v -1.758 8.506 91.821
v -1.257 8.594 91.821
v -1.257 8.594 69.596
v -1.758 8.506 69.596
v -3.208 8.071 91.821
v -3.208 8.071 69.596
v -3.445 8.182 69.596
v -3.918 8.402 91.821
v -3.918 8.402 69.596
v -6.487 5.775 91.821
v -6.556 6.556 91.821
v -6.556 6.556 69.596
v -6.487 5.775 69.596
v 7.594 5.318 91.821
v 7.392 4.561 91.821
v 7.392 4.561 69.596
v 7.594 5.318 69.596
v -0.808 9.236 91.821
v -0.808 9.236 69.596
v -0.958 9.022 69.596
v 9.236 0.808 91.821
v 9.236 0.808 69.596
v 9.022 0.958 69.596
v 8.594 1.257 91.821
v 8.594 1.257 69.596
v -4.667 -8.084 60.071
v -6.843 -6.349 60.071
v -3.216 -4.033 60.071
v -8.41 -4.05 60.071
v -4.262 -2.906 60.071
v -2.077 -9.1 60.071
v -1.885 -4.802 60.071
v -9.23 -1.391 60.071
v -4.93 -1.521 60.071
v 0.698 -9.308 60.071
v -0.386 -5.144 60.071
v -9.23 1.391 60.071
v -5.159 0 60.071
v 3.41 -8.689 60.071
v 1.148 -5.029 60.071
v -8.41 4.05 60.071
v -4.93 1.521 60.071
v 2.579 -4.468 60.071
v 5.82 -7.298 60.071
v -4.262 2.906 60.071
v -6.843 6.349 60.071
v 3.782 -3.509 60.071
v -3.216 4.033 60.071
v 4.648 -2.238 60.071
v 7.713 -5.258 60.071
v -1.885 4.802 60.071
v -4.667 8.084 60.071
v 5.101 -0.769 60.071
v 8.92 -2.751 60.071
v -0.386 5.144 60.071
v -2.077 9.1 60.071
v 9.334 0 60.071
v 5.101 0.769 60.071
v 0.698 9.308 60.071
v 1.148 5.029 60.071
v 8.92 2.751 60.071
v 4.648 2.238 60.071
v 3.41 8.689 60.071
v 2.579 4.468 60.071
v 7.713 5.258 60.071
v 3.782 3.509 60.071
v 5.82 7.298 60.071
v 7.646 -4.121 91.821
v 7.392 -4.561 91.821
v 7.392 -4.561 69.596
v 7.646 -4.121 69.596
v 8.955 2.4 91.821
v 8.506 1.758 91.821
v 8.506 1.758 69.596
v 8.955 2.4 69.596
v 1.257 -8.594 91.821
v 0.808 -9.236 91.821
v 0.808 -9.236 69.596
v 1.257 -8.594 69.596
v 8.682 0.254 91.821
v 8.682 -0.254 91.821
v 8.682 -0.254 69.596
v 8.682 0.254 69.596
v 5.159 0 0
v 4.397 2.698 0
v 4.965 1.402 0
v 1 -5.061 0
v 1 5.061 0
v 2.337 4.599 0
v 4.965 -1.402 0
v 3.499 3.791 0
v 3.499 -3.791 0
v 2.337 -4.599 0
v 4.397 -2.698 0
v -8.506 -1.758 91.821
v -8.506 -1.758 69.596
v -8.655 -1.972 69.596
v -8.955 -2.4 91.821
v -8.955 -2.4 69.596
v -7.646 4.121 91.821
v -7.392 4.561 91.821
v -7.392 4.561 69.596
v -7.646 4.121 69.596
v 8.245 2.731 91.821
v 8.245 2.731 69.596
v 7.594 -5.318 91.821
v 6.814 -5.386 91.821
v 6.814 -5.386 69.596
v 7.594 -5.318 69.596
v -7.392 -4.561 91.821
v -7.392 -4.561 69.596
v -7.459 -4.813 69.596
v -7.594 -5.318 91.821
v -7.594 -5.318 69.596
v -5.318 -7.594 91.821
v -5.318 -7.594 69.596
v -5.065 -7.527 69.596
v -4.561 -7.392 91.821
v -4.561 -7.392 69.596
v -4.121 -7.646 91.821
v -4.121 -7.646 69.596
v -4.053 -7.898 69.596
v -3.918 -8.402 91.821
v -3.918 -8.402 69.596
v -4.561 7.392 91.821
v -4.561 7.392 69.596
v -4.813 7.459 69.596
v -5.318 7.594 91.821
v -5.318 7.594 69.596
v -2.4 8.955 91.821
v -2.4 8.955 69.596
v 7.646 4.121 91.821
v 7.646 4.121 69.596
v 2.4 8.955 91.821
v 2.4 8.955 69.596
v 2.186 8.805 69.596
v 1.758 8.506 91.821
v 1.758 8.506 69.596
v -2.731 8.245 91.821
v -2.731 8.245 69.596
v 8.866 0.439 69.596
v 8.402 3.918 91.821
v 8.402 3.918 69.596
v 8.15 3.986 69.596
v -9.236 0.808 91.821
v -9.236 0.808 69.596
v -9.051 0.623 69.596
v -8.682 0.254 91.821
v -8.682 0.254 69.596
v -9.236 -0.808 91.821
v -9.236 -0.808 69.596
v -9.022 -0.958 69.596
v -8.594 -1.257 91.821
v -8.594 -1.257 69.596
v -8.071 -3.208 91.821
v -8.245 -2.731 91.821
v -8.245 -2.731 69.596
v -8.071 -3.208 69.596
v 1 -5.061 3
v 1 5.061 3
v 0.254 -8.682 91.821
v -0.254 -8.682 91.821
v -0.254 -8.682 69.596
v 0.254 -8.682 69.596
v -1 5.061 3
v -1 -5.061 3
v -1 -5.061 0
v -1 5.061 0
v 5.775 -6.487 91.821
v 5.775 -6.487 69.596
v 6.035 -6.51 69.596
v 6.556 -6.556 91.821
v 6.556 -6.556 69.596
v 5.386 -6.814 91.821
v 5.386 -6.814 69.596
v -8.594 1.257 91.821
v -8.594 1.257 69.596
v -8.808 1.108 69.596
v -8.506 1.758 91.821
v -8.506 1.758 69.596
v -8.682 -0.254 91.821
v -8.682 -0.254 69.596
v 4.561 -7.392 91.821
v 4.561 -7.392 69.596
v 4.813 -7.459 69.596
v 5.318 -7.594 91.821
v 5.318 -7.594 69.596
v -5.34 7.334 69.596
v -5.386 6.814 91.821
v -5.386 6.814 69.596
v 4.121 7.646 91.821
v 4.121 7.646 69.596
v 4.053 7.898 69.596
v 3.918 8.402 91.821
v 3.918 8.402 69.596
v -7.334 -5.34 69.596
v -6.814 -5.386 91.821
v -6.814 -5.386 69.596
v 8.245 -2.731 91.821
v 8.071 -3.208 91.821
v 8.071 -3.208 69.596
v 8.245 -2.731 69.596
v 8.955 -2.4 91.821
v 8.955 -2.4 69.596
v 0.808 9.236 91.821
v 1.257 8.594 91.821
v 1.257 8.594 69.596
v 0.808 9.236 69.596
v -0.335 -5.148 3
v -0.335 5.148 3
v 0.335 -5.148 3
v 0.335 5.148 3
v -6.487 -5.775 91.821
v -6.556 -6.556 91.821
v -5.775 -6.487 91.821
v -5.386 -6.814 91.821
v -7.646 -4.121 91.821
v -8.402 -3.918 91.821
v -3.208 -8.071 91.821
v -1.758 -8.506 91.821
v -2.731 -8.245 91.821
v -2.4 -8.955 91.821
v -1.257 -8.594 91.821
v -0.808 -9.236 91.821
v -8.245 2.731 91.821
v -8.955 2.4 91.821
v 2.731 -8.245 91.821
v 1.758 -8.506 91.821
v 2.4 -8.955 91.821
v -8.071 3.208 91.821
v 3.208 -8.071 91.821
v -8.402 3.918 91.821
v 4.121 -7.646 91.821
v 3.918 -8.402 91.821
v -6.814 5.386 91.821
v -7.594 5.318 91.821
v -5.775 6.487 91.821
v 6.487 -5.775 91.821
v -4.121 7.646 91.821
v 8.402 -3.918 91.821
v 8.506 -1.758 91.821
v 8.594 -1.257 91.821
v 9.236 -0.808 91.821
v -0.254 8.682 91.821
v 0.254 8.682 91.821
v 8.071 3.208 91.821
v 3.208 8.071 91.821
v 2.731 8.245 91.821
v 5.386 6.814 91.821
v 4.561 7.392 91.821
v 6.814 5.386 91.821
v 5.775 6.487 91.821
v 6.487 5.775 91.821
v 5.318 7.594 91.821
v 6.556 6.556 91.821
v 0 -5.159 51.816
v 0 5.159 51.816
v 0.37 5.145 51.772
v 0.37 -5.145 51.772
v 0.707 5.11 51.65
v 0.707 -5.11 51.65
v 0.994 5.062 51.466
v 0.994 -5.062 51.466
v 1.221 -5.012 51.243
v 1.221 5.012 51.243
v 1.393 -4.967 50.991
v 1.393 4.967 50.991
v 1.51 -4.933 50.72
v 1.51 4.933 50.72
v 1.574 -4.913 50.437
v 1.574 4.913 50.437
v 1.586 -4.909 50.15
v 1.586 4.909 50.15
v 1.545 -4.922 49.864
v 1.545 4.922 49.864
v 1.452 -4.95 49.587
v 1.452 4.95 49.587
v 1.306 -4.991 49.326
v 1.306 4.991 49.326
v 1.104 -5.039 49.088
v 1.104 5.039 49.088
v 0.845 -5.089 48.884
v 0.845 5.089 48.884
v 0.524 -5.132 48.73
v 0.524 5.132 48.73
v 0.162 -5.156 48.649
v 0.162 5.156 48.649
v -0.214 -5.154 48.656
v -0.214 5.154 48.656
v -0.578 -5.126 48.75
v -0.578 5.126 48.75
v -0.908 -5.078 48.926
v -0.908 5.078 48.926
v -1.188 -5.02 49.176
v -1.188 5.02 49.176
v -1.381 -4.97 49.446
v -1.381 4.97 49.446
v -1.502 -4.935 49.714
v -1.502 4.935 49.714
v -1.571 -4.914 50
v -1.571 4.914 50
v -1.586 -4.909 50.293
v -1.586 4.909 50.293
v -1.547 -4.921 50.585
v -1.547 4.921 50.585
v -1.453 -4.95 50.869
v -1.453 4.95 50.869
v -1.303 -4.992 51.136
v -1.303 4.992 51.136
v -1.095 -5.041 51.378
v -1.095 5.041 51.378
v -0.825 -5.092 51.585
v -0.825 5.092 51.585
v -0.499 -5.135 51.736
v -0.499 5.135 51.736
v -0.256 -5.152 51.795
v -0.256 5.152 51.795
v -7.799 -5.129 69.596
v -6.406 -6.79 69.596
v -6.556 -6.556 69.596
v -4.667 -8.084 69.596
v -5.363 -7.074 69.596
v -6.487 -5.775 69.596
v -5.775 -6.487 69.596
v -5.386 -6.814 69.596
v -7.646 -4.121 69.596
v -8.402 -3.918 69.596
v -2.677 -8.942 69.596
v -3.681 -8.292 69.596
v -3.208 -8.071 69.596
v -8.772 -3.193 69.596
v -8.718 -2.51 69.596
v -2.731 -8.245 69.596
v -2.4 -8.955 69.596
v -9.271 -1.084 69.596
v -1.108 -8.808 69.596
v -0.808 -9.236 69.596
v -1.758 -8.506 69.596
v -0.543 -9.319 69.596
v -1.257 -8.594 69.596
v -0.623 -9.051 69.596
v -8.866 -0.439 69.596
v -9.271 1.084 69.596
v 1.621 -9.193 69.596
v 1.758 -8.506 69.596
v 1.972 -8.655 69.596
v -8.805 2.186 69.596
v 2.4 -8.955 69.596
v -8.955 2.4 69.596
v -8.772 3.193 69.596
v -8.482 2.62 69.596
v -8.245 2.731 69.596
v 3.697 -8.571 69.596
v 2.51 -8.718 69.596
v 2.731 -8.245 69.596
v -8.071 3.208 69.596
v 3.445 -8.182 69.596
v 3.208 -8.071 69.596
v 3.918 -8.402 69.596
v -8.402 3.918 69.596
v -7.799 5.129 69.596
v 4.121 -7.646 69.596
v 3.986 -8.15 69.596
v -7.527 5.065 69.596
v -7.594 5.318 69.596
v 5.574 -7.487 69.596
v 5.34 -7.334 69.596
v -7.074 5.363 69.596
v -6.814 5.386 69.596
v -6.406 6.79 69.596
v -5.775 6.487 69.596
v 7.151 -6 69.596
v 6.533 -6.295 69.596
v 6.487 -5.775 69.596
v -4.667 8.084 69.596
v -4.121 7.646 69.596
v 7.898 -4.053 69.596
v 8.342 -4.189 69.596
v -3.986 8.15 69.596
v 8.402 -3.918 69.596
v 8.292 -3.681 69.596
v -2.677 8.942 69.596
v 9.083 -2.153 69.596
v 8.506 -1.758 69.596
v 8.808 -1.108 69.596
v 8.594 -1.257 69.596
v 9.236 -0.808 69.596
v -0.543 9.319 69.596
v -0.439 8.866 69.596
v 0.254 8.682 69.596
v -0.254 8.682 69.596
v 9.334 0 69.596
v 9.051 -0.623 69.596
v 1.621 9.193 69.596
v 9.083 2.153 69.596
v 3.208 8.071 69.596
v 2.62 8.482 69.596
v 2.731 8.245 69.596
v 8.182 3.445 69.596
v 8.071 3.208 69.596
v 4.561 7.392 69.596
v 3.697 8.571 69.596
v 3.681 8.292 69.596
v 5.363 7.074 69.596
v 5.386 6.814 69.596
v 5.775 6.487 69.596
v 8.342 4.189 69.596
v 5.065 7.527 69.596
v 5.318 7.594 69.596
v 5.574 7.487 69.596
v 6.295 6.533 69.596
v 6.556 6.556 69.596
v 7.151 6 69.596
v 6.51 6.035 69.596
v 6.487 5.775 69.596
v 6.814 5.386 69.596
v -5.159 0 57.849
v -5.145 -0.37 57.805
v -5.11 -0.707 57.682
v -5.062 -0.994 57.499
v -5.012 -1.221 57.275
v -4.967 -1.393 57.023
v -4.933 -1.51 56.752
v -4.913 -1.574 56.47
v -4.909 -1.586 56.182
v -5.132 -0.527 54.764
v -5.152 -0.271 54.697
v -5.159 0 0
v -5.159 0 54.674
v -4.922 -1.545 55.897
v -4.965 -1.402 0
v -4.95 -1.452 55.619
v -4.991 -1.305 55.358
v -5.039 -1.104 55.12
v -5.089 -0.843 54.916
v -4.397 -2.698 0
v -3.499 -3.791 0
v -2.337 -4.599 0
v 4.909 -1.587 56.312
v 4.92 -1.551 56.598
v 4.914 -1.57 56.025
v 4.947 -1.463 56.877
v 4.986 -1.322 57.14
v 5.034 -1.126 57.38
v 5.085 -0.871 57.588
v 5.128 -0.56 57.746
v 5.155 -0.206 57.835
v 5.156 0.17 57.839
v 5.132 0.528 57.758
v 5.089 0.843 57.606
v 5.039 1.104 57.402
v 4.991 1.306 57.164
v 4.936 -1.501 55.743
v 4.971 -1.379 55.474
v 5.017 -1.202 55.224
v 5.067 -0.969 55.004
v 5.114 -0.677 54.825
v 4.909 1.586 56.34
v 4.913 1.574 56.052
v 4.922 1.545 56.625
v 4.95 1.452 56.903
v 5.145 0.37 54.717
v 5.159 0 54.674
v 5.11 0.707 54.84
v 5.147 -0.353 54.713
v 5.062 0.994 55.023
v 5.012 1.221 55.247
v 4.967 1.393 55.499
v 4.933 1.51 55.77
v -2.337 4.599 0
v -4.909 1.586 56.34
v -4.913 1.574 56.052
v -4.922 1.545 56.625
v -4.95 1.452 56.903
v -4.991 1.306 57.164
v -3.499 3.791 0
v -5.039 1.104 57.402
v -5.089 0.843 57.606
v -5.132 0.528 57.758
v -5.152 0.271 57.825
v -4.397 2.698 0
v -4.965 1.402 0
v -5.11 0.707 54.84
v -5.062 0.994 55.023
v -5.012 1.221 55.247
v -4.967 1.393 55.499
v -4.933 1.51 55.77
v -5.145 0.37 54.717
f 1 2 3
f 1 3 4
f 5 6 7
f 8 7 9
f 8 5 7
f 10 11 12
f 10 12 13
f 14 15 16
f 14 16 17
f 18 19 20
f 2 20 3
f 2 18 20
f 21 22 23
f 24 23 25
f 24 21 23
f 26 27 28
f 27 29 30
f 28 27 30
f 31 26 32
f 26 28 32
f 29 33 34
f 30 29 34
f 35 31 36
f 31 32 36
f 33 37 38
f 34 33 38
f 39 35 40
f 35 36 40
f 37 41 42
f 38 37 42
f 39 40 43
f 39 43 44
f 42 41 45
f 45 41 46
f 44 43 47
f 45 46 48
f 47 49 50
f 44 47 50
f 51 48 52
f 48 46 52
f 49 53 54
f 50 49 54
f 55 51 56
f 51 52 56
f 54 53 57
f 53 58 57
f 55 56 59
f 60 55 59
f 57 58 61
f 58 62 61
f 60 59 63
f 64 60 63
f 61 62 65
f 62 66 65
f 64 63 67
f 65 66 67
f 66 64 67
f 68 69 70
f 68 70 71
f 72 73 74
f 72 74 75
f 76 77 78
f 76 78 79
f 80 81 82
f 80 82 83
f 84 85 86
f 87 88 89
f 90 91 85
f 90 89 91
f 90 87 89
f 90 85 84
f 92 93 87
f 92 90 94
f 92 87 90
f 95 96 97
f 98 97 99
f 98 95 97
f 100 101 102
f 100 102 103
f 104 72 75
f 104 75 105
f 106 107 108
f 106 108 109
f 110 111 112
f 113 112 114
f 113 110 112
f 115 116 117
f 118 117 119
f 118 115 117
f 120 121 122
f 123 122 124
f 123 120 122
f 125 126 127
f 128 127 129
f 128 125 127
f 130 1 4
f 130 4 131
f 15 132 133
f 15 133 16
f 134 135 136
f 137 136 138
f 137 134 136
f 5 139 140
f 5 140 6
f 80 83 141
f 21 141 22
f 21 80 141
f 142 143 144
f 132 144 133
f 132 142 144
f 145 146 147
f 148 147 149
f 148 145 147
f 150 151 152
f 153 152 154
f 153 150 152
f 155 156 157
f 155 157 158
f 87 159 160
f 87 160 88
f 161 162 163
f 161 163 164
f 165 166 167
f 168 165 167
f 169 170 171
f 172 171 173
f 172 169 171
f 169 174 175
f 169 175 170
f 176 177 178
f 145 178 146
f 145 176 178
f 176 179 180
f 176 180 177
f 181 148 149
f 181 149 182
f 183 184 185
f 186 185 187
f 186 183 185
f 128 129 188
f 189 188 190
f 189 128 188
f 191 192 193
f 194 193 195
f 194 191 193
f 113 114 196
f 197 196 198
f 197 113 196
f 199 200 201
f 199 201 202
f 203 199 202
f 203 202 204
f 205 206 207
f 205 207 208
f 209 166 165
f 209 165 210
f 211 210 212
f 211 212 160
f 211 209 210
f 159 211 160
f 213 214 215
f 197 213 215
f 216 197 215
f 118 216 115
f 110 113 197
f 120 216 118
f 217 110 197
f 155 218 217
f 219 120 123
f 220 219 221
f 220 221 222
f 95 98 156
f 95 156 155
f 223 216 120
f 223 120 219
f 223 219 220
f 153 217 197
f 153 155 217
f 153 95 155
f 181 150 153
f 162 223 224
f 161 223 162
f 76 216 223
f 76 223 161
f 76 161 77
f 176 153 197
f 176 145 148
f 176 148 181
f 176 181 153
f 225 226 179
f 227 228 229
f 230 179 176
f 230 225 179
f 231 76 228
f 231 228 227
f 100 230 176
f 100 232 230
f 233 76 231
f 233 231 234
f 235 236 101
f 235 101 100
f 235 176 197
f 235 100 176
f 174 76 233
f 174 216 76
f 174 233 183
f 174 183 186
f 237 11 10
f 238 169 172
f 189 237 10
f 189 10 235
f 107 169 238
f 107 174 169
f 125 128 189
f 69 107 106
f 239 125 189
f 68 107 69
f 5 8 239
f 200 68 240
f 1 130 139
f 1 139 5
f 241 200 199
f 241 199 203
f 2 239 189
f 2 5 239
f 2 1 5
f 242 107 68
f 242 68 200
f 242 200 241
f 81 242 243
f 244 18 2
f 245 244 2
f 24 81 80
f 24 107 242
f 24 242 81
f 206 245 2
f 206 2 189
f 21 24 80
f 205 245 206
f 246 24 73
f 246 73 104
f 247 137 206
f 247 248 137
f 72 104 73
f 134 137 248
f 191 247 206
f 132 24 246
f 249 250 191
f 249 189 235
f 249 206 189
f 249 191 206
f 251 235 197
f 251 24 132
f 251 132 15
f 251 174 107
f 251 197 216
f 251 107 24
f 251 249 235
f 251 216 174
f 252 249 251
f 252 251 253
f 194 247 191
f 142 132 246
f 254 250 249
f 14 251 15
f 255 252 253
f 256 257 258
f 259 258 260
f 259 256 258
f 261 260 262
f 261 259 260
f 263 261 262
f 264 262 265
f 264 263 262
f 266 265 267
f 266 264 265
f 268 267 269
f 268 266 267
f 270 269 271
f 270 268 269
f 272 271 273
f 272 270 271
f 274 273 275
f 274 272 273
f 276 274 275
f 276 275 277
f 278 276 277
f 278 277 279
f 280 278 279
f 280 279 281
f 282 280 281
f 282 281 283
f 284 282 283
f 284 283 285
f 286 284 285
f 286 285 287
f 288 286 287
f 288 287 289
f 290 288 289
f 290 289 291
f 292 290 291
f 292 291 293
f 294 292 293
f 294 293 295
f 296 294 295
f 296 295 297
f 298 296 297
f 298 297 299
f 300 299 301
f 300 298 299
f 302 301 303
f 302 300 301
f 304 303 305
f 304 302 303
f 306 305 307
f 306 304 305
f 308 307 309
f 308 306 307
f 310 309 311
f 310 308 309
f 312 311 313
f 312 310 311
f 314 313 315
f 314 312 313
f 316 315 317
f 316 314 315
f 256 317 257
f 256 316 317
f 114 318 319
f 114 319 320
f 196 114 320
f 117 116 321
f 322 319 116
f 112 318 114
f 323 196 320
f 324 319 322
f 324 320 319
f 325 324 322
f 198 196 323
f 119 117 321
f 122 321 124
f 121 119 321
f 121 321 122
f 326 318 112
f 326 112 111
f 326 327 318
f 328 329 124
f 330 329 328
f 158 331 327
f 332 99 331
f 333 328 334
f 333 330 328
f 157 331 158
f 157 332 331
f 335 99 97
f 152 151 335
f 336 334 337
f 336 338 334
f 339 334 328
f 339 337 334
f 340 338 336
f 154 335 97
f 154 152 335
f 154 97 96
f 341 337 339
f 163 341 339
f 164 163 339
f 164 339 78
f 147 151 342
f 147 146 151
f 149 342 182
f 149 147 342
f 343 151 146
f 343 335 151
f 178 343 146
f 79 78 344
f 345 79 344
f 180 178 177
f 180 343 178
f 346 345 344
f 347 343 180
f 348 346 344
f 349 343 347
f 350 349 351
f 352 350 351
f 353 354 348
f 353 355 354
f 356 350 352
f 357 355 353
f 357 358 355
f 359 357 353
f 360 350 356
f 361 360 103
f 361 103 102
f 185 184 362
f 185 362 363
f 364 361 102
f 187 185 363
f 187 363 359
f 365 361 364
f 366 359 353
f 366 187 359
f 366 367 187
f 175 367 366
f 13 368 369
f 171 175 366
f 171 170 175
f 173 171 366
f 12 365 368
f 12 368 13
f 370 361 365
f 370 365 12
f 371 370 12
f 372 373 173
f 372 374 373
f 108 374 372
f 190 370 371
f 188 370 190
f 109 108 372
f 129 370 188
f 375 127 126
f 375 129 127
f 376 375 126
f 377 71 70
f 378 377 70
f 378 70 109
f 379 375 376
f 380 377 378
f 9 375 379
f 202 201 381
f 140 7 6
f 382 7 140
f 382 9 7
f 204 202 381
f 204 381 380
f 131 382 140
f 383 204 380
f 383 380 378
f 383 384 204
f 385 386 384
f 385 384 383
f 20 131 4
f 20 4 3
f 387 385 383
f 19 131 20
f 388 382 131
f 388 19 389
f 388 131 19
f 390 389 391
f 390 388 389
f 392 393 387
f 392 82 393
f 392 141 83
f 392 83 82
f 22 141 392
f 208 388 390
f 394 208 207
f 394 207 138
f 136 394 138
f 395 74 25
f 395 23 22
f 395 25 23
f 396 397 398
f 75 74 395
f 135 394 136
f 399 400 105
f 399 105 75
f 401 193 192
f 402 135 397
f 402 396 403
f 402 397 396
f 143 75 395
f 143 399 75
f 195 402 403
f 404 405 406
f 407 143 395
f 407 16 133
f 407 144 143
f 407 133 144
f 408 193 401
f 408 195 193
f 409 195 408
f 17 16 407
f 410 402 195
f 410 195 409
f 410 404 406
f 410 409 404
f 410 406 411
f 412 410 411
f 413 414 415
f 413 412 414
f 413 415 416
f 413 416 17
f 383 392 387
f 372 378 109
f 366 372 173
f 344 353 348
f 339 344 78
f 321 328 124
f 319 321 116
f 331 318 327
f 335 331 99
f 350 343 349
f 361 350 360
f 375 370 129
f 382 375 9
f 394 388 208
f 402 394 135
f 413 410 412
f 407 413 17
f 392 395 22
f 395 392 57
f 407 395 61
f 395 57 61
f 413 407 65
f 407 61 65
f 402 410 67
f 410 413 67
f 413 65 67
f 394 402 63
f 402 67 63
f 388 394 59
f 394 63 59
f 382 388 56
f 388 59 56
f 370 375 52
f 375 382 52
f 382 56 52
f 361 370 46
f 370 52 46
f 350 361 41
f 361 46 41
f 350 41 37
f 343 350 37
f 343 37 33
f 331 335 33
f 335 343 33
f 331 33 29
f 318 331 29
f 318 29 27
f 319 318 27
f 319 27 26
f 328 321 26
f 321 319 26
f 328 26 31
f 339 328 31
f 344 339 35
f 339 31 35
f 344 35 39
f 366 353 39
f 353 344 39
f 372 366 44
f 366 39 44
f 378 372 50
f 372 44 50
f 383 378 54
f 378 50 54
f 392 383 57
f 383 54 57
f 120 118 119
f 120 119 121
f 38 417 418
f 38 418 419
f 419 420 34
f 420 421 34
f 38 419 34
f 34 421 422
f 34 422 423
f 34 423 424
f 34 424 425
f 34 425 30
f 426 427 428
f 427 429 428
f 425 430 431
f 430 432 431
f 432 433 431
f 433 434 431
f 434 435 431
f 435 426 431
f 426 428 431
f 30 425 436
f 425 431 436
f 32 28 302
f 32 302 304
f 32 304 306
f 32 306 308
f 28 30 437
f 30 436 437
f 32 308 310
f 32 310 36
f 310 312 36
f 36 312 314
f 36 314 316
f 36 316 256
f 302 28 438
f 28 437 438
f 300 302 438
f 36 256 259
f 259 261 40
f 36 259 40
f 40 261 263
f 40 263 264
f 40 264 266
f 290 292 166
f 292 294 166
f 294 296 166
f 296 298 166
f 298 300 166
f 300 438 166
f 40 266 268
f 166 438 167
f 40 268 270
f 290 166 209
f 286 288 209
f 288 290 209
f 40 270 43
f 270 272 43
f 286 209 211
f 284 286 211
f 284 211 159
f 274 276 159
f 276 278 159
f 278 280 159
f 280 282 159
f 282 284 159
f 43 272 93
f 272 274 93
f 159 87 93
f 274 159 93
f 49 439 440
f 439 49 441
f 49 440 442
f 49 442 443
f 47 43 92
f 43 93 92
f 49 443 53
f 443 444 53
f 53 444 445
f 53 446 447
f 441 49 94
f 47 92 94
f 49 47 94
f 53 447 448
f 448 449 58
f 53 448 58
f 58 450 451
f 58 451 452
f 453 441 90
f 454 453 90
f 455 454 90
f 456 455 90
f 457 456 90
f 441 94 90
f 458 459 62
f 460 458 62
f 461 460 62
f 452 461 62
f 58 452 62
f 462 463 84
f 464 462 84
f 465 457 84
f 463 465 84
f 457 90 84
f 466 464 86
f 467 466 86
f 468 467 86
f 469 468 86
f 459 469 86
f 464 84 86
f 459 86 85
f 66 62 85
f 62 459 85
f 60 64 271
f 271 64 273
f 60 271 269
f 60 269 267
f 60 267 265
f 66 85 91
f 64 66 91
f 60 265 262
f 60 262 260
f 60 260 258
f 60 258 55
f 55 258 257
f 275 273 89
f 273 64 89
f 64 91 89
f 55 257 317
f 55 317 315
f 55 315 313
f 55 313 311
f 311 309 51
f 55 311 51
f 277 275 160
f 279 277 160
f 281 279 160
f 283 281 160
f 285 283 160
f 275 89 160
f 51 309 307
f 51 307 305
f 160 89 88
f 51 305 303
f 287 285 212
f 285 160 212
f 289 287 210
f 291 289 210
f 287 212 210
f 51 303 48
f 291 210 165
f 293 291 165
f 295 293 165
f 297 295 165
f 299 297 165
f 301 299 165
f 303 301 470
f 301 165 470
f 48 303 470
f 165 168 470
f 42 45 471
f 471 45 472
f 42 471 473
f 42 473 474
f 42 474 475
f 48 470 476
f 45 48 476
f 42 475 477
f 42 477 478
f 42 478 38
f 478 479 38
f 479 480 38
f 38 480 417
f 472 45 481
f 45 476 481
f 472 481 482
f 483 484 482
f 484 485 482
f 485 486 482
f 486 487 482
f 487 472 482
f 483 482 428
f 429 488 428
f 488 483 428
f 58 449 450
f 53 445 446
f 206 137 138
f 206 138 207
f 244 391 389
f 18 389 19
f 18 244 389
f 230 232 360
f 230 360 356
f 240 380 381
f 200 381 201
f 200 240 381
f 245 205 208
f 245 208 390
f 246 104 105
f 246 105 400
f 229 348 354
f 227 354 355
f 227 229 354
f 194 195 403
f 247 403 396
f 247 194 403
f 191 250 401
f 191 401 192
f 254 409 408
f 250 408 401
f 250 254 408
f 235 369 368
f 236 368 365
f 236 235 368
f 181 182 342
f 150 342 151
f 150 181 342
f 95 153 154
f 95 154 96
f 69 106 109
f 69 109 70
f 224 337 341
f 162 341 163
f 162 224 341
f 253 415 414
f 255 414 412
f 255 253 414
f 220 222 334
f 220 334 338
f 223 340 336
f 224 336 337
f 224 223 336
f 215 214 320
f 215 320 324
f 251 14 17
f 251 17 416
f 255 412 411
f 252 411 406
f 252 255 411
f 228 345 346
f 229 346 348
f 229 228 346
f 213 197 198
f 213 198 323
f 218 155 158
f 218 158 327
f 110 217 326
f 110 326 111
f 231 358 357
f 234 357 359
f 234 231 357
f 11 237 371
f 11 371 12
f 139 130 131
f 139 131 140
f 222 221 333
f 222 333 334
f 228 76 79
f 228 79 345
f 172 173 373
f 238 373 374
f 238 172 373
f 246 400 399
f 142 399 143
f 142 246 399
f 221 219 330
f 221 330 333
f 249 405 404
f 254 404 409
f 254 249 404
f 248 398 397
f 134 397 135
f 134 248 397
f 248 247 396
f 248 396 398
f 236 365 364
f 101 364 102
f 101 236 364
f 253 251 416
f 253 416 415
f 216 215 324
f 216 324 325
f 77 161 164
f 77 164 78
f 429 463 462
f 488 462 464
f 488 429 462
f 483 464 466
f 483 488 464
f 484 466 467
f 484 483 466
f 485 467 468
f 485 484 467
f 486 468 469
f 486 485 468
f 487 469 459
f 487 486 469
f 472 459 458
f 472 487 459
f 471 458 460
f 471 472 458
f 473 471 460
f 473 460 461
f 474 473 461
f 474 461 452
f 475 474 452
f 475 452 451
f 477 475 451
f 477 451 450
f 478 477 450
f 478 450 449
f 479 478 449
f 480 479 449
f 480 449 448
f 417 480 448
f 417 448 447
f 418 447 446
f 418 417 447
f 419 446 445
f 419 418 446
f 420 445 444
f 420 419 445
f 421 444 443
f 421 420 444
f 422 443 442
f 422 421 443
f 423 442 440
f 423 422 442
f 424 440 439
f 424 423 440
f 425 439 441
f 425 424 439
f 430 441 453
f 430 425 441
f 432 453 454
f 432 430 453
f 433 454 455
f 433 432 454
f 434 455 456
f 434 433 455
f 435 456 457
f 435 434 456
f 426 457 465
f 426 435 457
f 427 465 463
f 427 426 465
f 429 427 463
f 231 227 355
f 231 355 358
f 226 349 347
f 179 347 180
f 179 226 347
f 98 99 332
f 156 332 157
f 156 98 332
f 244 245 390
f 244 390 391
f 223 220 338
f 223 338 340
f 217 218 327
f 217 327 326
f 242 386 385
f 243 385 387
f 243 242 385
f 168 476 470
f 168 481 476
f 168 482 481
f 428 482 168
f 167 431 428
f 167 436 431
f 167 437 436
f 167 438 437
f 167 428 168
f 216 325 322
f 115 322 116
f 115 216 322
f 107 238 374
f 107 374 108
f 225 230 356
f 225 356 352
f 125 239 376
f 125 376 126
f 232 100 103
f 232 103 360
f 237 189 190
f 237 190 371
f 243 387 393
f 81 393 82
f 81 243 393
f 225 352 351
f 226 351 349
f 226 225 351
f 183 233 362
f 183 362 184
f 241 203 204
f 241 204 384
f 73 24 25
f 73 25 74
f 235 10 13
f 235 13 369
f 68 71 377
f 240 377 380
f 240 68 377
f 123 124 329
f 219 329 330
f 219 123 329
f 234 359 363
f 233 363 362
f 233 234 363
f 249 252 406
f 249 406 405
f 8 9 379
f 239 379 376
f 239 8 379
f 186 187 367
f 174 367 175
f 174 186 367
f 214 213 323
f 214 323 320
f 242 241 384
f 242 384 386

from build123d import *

# Parameters (mm, degrees)
SKETCH5_W                = 5.15874
SKETCH5_H                = 60.071
SKETCH10_R               = 9.3345
BOSS_EXTRUDE1_DEPTH      = 31.75
CUT_EXTRUDE7_START       = 91.821
SKETCH8_R                = 12.7
CUT_EXTRUDE7_DEPTH       = 22.225
CUT_EXTRUDE9_DEPTH       = 93.765089454
CUT_EXTRUDE9_DEPTH_BACK  = 93.765089454
SKETCH11_W               = 2
SKETCH11_H               = 3
CUT_EXTRUDE10_DEPTH      = 93.765089454
CUT_EXTRUDE10_DEPTH_BACK = 93.765089454
SKETCH12_R               = 1.5875
CUT_EXTRUDE11_DEPTH      = 93.765089454
CUT_EXTRUDE11_DEPTH_BACK = 93.765089454
SKETCH13_R               = 1.5875


with BuildPart() as part:
    # Sketch5 → Revolve2 (revolve)
    with BuildSketch(Plane(origin=(0, 0, 0), x_dir=(1, 0, 0), z_dir=(0, 1, 0)), mode=Mode.PRIVATE) as revolve2_sk:
        with Locations((2.57937, -30.0355)):
            Rectangle(SKETCH5_W, SKETCH5_H)
    revolve(revolve2_sk.sketch.rotate(Axis((0, 0, 0), (0, 0, 1)), 180), axis=Axis((0, 0, 0), (0, 0, 1)))

    # Sketch10 → Boss-Extrude1 (add)
    with BuildSketch(Plane.XY.offset(60.071)):
        Circle(SKETCH10_R)
    extrude(amount=BOSS_EXTRUDE1_DEPTH)

    # Sketch8 → Cut-Extrude7 (cut)
    with BuildSketch(Plane.XY.offset(CUT_EXTRUDE7_START)):
        Circle(SKETCH8_R)
        Polygon((9.235721046, -0.808020891), (8.681700155, -0.254), (8.681700155, 0.254), (9.235721046, 0.808020891), (8.593912259, 1.257420242), (8.505698985, 1.75770258), (8.955098336, 2.399511367), (8.245002688, 2.730634406), (8.071256455, 3.207998257), (8.402379494, 3.918093905), (7.645572882, 4.120879625), (7.391572882, 4.56082053), (7.594358603, 5.317627141), (6.813836213, 5.385914002), (6.487300108, 5.775064579), (6.555586968, 6.555586968), (5.775064579, 6.487300108), (5.385914002, 6.813836213), (5.317627141, 7.594358603), (4.56082053, 7.391572882), (4.120879625, 7.645572882), (3.918093905, 8.402379494), (3.207998257, 8.071256455), (2.730634406, 8.245002688), (2.399511367, 8.955098336), (1.75770258, 8.505698985), (1.257420242, 8.593912259), (0.808020891, 9.235721046), (0.254, 8.681700155), (-0.254, 8.681700155), (-0.808020891, 9.235721046), (-1.257420242, 8.593912259), (-1.75770258, 8.505698985), (-2.399511367, 8.955098336), (-2.730634406, 8.245002688), (-3.207998257, 8.071256455), (-3.918093905, 8.402379494), (-4.120879625, 7.645572882), (-4.56082053, 7.391572882), (-5.317627141, 7.594358603), (-5.385914002, 6.813836213), (-5.775064579, 6.487300108), (-6.555586968, 6.555586968), (-6.487300108, 5.775064579), (-6.813836213, 5.385914002), (-7.594358603, 5.317627141), (-7.391572882, 4.56082053), (-7.645572882, 4.120879625), (-8.402379494, 3.918093905), (-8.071256455, 3.207998257), (-8.245002688, 2.730634406), (-8.955098336, 2.399511367), (-8.505698985, 1.75770258), (-8.593912259, 1.257420242), (-9.235721046, 0.808020891), (-8.681700155, 0.254), (-8.681700155, -0.254), (-9.235721046, -0.808020891), (-8.593912259, -1.257420242), (-8.505698985, -1.75770258), (-8.955098336, -2.399511367), (-8.245002688, -2.730634406), (-8.071256455, -3.207998257), (-8.402379494, -3.918093905), (-7.645572882, -4.120879625), (-7.391572882, -4.56082053), (-7.594358603, -5.317627141), (-6.813836213, -5.385914002), (-6.487300108, -5.775064579), (-6.555586968, -6.555586968), (-5.775064579, -6.487300108), (-5.385914002, -6.813836213), (-5.317627141, -7.594358603), (-4.56082053, -7.391572882), (-4.120879625, -7.645572882), (-3.918093905, -8.402379494), (-3.207998257, -8.071256455), (-2.730634406, -8.245002688), (-2.399511367, -8.955098336), (-1.75770258, -8.505698985), (-1.257420242, -8.593912259), (-0.808020891, -9.235721046), (-0.254, -8.681700155), (0.254, -8.681700155), (0.808020891, -9.235721046), (1.257420242, -8.593912259), (1.75770258, -8.505698985), (2.399511367, -8.955098336), (2.730634406, -8.245002688), (3.207998257, -8.071256455), (3.918093905, -8.402379494), (4.120879625, -7.645572882), (4.56082053, -7.391572882), (5.317627141, -7.594358603), (5.385914002, -6.813836213), (5.775064579, -6.487300108), (6.555586968, -6.555586968), (6.487300108, -5.775064579), (6.813836213, -5.385914002), (7.594358603, -5.317627141), (7.391572882, -4.56082053), (7.645572882, -4.120879625), (8.402379494, -3.918093905), (8.071256455, -3.207998257), (8.245002688, -2.730634406), (8.955098336, -2.399511367), (8.505698985, -1.75770258), (8.593912259, -1.257420242), align=None, mode=Mode.SUBTRACT)
    extrude(amount=-CUT_EXTRUDE7_DEPTH, mode=Mode.SUBTRACT)

    # Sketch11 → Cut-Extrude9 (cut, two sides: drawn at the far end of the back side and taken through both)
    with BuildSketch(Plane(origin=(0, 0, 0), x_dir=(1, 0, 0), z_dir=(0, 1, 0)).offset(-CUT_EXTRUDE9_DEPTH_BACK)):
        with Locations((0, -1.5)):
            Rectangle(SKETCH11_W, SKETCH11_H)
    extrude(amount=CUT_EXTRUDE9_DEPTH + CUT_EXTRUDE9_DEPTH_BACK, mode=Mode.SUBTRACT)

    # Sketch12 → Cut-Extrude10 (cut, two sides: drawn at the far end of the back side and taken through both)
    with BuildSketch(Plane(origin=(0, 0, 0), x_dir=(1, 0, 0), z_dir=(0, 1, 0)).offset(-CUT_EXTRUDE10_DEPTH_BACK)):
        with Locations(Location((0, -50.2285, 0), (0, 0, 270))):
            Circle(SKETCH12_R)
    extrude(amount=CUT_EXTRUDE10_DEPTH + CUT_EXTRUDE10_DEPTH_BACK, mode=Mode.SUBTRACT)

    # Sketch13 → Cut-Extrude11 (cut, two sides: drawn at the far end of the back side and taken through both)
    with BuildSketch(Plane(origin=(0, 0, 0), x_dir=(0, 0, -1), z_dir=(1, 0, 0)).offset(-CUT_EXTRUDE11_DEPTH_BACK)):
        with Locations((-56.261, 0)):
            Circle(SKETCH13_R)
    extrude(amount=CUT_EXTRUDE11_DEPTH + CUT_EXTRUDE11_DEPTH_BACK, mode=Mode.SUBTRACT)


solid = part.part
